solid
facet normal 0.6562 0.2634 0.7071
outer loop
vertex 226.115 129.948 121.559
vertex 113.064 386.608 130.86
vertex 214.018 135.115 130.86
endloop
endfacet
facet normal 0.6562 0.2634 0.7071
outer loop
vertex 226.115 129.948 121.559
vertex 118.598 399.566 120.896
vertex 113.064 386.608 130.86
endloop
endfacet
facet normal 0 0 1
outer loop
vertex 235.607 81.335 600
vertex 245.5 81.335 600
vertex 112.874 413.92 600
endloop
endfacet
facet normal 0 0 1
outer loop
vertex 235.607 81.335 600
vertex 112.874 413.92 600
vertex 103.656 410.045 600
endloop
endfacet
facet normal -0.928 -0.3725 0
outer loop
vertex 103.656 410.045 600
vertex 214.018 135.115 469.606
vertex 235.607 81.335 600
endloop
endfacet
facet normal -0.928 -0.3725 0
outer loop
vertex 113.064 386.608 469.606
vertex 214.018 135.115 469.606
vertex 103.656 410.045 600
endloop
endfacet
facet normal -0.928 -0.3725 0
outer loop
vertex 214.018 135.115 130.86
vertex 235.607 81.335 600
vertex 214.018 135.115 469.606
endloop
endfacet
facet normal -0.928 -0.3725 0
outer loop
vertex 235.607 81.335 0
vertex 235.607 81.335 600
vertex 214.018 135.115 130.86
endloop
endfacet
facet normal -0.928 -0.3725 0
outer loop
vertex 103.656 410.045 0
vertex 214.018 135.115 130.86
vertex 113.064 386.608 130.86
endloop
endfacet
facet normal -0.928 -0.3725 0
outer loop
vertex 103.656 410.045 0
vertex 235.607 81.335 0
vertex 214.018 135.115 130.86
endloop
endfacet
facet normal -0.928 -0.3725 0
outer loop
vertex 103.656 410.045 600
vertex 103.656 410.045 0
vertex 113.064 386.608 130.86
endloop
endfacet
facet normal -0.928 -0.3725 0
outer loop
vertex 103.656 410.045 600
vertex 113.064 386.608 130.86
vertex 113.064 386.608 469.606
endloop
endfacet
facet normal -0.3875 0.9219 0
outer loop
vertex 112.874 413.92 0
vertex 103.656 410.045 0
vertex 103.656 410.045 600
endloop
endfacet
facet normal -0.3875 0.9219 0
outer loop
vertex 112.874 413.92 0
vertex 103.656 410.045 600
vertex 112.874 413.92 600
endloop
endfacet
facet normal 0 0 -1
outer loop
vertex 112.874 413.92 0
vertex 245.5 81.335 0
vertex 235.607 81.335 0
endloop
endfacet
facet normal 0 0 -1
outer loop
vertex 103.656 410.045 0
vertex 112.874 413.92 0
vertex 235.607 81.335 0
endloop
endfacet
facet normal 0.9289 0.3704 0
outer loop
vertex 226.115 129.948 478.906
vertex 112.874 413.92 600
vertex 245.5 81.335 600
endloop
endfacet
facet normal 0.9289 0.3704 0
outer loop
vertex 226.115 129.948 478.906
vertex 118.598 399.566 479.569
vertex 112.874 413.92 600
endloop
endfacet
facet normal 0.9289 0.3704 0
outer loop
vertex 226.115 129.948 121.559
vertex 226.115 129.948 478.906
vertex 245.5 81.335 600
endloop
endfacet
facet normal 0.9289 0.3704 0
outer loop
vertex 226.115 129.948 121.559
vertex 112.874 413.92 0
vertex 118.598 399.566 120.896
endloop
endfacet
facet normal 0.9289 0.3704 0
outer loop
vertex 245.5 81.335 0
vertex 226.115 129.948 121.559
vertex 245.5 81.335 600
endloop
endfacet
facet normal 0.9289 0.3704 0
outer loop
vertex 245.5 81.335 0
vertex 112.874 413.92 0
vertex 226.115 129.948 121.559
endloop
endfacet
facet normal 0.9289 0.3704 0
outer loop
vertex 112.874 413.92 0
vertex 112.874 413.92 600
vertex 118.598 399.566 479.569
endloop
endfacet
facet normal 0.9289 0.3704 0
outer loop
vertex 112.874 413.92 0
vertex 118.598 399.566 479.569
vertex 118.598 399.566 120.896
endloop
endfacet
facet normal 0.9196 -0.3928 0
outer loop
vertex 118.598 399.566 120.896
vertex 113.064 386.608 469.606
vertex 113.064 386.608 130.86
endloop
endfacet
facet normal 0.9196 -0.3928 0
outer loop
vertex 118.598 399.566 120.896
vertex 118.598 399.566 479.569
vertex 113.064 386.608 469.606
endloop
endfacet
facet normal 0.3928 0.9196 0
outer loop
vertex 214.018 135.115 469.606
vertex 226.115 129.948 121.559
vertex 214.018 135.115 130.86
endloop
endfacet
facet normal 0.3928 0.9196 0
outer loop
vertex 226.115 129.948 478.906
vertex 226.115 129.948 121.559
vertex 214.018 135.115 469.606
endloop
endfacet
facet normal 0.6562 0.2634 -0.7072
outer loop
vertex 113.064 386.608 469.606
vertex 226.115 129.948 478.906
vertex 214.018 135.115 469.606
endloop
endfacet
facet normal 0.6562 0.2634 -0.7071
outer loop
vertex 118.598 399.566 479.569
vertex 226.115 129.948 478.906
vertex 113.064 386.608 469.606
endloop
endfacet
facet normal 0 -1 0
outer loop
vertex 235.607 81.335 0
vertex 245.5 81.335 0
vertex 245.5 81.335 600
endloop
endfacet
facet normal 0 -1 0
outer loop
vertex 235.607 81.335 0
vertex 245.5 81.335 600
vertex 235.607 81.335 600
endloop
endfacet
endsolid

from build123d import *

# Parameters (mm, degrees)
BOSS_EXTRU_1_DEPTH      = 600
ESQUISSE2_W             = 338.746
ESQUISSE2_H             = 271
ENL_V_MAT_EXTRU_1_DEPTH = 10
ENL_V_MAT_EXTRU_1_TAPER = -45


with BuildPart() as part:
    # Esquisse1 → Boss.-Extru.1 (new body)
    with BuildSketch(Plane.XY):
        Polygon((235.606802378, 81.334991463), (103.65574387, 410.044643603), (112.874448857, 413.919624682), (245.500189591, 81.334991463), align=None)
    extrude(amount=BOSS_EXTRU_1_DEPTH)

    # Esquisse2 → Enlèv. mat.-Extru.1 (cut)
    with BuildSketch(Plane(origin=(231.028658646, 92.739826335, 0), x_dir=(0, 0, 1), z_dir=(-0.928021166, -0.37252747, 0))):
        with Locations((300.232670333, 181.16149611)):
            Rectangle(ESQUISSE2_W, ESQUISSE2_H)
    extrude(amount=-ENL_V_MAT_EXTRU_1_DEPTH, taper=ENL_V_MAT_EXTRU_1_TAPER, mode=Mode.SUBTRACT)


solid = part.part
